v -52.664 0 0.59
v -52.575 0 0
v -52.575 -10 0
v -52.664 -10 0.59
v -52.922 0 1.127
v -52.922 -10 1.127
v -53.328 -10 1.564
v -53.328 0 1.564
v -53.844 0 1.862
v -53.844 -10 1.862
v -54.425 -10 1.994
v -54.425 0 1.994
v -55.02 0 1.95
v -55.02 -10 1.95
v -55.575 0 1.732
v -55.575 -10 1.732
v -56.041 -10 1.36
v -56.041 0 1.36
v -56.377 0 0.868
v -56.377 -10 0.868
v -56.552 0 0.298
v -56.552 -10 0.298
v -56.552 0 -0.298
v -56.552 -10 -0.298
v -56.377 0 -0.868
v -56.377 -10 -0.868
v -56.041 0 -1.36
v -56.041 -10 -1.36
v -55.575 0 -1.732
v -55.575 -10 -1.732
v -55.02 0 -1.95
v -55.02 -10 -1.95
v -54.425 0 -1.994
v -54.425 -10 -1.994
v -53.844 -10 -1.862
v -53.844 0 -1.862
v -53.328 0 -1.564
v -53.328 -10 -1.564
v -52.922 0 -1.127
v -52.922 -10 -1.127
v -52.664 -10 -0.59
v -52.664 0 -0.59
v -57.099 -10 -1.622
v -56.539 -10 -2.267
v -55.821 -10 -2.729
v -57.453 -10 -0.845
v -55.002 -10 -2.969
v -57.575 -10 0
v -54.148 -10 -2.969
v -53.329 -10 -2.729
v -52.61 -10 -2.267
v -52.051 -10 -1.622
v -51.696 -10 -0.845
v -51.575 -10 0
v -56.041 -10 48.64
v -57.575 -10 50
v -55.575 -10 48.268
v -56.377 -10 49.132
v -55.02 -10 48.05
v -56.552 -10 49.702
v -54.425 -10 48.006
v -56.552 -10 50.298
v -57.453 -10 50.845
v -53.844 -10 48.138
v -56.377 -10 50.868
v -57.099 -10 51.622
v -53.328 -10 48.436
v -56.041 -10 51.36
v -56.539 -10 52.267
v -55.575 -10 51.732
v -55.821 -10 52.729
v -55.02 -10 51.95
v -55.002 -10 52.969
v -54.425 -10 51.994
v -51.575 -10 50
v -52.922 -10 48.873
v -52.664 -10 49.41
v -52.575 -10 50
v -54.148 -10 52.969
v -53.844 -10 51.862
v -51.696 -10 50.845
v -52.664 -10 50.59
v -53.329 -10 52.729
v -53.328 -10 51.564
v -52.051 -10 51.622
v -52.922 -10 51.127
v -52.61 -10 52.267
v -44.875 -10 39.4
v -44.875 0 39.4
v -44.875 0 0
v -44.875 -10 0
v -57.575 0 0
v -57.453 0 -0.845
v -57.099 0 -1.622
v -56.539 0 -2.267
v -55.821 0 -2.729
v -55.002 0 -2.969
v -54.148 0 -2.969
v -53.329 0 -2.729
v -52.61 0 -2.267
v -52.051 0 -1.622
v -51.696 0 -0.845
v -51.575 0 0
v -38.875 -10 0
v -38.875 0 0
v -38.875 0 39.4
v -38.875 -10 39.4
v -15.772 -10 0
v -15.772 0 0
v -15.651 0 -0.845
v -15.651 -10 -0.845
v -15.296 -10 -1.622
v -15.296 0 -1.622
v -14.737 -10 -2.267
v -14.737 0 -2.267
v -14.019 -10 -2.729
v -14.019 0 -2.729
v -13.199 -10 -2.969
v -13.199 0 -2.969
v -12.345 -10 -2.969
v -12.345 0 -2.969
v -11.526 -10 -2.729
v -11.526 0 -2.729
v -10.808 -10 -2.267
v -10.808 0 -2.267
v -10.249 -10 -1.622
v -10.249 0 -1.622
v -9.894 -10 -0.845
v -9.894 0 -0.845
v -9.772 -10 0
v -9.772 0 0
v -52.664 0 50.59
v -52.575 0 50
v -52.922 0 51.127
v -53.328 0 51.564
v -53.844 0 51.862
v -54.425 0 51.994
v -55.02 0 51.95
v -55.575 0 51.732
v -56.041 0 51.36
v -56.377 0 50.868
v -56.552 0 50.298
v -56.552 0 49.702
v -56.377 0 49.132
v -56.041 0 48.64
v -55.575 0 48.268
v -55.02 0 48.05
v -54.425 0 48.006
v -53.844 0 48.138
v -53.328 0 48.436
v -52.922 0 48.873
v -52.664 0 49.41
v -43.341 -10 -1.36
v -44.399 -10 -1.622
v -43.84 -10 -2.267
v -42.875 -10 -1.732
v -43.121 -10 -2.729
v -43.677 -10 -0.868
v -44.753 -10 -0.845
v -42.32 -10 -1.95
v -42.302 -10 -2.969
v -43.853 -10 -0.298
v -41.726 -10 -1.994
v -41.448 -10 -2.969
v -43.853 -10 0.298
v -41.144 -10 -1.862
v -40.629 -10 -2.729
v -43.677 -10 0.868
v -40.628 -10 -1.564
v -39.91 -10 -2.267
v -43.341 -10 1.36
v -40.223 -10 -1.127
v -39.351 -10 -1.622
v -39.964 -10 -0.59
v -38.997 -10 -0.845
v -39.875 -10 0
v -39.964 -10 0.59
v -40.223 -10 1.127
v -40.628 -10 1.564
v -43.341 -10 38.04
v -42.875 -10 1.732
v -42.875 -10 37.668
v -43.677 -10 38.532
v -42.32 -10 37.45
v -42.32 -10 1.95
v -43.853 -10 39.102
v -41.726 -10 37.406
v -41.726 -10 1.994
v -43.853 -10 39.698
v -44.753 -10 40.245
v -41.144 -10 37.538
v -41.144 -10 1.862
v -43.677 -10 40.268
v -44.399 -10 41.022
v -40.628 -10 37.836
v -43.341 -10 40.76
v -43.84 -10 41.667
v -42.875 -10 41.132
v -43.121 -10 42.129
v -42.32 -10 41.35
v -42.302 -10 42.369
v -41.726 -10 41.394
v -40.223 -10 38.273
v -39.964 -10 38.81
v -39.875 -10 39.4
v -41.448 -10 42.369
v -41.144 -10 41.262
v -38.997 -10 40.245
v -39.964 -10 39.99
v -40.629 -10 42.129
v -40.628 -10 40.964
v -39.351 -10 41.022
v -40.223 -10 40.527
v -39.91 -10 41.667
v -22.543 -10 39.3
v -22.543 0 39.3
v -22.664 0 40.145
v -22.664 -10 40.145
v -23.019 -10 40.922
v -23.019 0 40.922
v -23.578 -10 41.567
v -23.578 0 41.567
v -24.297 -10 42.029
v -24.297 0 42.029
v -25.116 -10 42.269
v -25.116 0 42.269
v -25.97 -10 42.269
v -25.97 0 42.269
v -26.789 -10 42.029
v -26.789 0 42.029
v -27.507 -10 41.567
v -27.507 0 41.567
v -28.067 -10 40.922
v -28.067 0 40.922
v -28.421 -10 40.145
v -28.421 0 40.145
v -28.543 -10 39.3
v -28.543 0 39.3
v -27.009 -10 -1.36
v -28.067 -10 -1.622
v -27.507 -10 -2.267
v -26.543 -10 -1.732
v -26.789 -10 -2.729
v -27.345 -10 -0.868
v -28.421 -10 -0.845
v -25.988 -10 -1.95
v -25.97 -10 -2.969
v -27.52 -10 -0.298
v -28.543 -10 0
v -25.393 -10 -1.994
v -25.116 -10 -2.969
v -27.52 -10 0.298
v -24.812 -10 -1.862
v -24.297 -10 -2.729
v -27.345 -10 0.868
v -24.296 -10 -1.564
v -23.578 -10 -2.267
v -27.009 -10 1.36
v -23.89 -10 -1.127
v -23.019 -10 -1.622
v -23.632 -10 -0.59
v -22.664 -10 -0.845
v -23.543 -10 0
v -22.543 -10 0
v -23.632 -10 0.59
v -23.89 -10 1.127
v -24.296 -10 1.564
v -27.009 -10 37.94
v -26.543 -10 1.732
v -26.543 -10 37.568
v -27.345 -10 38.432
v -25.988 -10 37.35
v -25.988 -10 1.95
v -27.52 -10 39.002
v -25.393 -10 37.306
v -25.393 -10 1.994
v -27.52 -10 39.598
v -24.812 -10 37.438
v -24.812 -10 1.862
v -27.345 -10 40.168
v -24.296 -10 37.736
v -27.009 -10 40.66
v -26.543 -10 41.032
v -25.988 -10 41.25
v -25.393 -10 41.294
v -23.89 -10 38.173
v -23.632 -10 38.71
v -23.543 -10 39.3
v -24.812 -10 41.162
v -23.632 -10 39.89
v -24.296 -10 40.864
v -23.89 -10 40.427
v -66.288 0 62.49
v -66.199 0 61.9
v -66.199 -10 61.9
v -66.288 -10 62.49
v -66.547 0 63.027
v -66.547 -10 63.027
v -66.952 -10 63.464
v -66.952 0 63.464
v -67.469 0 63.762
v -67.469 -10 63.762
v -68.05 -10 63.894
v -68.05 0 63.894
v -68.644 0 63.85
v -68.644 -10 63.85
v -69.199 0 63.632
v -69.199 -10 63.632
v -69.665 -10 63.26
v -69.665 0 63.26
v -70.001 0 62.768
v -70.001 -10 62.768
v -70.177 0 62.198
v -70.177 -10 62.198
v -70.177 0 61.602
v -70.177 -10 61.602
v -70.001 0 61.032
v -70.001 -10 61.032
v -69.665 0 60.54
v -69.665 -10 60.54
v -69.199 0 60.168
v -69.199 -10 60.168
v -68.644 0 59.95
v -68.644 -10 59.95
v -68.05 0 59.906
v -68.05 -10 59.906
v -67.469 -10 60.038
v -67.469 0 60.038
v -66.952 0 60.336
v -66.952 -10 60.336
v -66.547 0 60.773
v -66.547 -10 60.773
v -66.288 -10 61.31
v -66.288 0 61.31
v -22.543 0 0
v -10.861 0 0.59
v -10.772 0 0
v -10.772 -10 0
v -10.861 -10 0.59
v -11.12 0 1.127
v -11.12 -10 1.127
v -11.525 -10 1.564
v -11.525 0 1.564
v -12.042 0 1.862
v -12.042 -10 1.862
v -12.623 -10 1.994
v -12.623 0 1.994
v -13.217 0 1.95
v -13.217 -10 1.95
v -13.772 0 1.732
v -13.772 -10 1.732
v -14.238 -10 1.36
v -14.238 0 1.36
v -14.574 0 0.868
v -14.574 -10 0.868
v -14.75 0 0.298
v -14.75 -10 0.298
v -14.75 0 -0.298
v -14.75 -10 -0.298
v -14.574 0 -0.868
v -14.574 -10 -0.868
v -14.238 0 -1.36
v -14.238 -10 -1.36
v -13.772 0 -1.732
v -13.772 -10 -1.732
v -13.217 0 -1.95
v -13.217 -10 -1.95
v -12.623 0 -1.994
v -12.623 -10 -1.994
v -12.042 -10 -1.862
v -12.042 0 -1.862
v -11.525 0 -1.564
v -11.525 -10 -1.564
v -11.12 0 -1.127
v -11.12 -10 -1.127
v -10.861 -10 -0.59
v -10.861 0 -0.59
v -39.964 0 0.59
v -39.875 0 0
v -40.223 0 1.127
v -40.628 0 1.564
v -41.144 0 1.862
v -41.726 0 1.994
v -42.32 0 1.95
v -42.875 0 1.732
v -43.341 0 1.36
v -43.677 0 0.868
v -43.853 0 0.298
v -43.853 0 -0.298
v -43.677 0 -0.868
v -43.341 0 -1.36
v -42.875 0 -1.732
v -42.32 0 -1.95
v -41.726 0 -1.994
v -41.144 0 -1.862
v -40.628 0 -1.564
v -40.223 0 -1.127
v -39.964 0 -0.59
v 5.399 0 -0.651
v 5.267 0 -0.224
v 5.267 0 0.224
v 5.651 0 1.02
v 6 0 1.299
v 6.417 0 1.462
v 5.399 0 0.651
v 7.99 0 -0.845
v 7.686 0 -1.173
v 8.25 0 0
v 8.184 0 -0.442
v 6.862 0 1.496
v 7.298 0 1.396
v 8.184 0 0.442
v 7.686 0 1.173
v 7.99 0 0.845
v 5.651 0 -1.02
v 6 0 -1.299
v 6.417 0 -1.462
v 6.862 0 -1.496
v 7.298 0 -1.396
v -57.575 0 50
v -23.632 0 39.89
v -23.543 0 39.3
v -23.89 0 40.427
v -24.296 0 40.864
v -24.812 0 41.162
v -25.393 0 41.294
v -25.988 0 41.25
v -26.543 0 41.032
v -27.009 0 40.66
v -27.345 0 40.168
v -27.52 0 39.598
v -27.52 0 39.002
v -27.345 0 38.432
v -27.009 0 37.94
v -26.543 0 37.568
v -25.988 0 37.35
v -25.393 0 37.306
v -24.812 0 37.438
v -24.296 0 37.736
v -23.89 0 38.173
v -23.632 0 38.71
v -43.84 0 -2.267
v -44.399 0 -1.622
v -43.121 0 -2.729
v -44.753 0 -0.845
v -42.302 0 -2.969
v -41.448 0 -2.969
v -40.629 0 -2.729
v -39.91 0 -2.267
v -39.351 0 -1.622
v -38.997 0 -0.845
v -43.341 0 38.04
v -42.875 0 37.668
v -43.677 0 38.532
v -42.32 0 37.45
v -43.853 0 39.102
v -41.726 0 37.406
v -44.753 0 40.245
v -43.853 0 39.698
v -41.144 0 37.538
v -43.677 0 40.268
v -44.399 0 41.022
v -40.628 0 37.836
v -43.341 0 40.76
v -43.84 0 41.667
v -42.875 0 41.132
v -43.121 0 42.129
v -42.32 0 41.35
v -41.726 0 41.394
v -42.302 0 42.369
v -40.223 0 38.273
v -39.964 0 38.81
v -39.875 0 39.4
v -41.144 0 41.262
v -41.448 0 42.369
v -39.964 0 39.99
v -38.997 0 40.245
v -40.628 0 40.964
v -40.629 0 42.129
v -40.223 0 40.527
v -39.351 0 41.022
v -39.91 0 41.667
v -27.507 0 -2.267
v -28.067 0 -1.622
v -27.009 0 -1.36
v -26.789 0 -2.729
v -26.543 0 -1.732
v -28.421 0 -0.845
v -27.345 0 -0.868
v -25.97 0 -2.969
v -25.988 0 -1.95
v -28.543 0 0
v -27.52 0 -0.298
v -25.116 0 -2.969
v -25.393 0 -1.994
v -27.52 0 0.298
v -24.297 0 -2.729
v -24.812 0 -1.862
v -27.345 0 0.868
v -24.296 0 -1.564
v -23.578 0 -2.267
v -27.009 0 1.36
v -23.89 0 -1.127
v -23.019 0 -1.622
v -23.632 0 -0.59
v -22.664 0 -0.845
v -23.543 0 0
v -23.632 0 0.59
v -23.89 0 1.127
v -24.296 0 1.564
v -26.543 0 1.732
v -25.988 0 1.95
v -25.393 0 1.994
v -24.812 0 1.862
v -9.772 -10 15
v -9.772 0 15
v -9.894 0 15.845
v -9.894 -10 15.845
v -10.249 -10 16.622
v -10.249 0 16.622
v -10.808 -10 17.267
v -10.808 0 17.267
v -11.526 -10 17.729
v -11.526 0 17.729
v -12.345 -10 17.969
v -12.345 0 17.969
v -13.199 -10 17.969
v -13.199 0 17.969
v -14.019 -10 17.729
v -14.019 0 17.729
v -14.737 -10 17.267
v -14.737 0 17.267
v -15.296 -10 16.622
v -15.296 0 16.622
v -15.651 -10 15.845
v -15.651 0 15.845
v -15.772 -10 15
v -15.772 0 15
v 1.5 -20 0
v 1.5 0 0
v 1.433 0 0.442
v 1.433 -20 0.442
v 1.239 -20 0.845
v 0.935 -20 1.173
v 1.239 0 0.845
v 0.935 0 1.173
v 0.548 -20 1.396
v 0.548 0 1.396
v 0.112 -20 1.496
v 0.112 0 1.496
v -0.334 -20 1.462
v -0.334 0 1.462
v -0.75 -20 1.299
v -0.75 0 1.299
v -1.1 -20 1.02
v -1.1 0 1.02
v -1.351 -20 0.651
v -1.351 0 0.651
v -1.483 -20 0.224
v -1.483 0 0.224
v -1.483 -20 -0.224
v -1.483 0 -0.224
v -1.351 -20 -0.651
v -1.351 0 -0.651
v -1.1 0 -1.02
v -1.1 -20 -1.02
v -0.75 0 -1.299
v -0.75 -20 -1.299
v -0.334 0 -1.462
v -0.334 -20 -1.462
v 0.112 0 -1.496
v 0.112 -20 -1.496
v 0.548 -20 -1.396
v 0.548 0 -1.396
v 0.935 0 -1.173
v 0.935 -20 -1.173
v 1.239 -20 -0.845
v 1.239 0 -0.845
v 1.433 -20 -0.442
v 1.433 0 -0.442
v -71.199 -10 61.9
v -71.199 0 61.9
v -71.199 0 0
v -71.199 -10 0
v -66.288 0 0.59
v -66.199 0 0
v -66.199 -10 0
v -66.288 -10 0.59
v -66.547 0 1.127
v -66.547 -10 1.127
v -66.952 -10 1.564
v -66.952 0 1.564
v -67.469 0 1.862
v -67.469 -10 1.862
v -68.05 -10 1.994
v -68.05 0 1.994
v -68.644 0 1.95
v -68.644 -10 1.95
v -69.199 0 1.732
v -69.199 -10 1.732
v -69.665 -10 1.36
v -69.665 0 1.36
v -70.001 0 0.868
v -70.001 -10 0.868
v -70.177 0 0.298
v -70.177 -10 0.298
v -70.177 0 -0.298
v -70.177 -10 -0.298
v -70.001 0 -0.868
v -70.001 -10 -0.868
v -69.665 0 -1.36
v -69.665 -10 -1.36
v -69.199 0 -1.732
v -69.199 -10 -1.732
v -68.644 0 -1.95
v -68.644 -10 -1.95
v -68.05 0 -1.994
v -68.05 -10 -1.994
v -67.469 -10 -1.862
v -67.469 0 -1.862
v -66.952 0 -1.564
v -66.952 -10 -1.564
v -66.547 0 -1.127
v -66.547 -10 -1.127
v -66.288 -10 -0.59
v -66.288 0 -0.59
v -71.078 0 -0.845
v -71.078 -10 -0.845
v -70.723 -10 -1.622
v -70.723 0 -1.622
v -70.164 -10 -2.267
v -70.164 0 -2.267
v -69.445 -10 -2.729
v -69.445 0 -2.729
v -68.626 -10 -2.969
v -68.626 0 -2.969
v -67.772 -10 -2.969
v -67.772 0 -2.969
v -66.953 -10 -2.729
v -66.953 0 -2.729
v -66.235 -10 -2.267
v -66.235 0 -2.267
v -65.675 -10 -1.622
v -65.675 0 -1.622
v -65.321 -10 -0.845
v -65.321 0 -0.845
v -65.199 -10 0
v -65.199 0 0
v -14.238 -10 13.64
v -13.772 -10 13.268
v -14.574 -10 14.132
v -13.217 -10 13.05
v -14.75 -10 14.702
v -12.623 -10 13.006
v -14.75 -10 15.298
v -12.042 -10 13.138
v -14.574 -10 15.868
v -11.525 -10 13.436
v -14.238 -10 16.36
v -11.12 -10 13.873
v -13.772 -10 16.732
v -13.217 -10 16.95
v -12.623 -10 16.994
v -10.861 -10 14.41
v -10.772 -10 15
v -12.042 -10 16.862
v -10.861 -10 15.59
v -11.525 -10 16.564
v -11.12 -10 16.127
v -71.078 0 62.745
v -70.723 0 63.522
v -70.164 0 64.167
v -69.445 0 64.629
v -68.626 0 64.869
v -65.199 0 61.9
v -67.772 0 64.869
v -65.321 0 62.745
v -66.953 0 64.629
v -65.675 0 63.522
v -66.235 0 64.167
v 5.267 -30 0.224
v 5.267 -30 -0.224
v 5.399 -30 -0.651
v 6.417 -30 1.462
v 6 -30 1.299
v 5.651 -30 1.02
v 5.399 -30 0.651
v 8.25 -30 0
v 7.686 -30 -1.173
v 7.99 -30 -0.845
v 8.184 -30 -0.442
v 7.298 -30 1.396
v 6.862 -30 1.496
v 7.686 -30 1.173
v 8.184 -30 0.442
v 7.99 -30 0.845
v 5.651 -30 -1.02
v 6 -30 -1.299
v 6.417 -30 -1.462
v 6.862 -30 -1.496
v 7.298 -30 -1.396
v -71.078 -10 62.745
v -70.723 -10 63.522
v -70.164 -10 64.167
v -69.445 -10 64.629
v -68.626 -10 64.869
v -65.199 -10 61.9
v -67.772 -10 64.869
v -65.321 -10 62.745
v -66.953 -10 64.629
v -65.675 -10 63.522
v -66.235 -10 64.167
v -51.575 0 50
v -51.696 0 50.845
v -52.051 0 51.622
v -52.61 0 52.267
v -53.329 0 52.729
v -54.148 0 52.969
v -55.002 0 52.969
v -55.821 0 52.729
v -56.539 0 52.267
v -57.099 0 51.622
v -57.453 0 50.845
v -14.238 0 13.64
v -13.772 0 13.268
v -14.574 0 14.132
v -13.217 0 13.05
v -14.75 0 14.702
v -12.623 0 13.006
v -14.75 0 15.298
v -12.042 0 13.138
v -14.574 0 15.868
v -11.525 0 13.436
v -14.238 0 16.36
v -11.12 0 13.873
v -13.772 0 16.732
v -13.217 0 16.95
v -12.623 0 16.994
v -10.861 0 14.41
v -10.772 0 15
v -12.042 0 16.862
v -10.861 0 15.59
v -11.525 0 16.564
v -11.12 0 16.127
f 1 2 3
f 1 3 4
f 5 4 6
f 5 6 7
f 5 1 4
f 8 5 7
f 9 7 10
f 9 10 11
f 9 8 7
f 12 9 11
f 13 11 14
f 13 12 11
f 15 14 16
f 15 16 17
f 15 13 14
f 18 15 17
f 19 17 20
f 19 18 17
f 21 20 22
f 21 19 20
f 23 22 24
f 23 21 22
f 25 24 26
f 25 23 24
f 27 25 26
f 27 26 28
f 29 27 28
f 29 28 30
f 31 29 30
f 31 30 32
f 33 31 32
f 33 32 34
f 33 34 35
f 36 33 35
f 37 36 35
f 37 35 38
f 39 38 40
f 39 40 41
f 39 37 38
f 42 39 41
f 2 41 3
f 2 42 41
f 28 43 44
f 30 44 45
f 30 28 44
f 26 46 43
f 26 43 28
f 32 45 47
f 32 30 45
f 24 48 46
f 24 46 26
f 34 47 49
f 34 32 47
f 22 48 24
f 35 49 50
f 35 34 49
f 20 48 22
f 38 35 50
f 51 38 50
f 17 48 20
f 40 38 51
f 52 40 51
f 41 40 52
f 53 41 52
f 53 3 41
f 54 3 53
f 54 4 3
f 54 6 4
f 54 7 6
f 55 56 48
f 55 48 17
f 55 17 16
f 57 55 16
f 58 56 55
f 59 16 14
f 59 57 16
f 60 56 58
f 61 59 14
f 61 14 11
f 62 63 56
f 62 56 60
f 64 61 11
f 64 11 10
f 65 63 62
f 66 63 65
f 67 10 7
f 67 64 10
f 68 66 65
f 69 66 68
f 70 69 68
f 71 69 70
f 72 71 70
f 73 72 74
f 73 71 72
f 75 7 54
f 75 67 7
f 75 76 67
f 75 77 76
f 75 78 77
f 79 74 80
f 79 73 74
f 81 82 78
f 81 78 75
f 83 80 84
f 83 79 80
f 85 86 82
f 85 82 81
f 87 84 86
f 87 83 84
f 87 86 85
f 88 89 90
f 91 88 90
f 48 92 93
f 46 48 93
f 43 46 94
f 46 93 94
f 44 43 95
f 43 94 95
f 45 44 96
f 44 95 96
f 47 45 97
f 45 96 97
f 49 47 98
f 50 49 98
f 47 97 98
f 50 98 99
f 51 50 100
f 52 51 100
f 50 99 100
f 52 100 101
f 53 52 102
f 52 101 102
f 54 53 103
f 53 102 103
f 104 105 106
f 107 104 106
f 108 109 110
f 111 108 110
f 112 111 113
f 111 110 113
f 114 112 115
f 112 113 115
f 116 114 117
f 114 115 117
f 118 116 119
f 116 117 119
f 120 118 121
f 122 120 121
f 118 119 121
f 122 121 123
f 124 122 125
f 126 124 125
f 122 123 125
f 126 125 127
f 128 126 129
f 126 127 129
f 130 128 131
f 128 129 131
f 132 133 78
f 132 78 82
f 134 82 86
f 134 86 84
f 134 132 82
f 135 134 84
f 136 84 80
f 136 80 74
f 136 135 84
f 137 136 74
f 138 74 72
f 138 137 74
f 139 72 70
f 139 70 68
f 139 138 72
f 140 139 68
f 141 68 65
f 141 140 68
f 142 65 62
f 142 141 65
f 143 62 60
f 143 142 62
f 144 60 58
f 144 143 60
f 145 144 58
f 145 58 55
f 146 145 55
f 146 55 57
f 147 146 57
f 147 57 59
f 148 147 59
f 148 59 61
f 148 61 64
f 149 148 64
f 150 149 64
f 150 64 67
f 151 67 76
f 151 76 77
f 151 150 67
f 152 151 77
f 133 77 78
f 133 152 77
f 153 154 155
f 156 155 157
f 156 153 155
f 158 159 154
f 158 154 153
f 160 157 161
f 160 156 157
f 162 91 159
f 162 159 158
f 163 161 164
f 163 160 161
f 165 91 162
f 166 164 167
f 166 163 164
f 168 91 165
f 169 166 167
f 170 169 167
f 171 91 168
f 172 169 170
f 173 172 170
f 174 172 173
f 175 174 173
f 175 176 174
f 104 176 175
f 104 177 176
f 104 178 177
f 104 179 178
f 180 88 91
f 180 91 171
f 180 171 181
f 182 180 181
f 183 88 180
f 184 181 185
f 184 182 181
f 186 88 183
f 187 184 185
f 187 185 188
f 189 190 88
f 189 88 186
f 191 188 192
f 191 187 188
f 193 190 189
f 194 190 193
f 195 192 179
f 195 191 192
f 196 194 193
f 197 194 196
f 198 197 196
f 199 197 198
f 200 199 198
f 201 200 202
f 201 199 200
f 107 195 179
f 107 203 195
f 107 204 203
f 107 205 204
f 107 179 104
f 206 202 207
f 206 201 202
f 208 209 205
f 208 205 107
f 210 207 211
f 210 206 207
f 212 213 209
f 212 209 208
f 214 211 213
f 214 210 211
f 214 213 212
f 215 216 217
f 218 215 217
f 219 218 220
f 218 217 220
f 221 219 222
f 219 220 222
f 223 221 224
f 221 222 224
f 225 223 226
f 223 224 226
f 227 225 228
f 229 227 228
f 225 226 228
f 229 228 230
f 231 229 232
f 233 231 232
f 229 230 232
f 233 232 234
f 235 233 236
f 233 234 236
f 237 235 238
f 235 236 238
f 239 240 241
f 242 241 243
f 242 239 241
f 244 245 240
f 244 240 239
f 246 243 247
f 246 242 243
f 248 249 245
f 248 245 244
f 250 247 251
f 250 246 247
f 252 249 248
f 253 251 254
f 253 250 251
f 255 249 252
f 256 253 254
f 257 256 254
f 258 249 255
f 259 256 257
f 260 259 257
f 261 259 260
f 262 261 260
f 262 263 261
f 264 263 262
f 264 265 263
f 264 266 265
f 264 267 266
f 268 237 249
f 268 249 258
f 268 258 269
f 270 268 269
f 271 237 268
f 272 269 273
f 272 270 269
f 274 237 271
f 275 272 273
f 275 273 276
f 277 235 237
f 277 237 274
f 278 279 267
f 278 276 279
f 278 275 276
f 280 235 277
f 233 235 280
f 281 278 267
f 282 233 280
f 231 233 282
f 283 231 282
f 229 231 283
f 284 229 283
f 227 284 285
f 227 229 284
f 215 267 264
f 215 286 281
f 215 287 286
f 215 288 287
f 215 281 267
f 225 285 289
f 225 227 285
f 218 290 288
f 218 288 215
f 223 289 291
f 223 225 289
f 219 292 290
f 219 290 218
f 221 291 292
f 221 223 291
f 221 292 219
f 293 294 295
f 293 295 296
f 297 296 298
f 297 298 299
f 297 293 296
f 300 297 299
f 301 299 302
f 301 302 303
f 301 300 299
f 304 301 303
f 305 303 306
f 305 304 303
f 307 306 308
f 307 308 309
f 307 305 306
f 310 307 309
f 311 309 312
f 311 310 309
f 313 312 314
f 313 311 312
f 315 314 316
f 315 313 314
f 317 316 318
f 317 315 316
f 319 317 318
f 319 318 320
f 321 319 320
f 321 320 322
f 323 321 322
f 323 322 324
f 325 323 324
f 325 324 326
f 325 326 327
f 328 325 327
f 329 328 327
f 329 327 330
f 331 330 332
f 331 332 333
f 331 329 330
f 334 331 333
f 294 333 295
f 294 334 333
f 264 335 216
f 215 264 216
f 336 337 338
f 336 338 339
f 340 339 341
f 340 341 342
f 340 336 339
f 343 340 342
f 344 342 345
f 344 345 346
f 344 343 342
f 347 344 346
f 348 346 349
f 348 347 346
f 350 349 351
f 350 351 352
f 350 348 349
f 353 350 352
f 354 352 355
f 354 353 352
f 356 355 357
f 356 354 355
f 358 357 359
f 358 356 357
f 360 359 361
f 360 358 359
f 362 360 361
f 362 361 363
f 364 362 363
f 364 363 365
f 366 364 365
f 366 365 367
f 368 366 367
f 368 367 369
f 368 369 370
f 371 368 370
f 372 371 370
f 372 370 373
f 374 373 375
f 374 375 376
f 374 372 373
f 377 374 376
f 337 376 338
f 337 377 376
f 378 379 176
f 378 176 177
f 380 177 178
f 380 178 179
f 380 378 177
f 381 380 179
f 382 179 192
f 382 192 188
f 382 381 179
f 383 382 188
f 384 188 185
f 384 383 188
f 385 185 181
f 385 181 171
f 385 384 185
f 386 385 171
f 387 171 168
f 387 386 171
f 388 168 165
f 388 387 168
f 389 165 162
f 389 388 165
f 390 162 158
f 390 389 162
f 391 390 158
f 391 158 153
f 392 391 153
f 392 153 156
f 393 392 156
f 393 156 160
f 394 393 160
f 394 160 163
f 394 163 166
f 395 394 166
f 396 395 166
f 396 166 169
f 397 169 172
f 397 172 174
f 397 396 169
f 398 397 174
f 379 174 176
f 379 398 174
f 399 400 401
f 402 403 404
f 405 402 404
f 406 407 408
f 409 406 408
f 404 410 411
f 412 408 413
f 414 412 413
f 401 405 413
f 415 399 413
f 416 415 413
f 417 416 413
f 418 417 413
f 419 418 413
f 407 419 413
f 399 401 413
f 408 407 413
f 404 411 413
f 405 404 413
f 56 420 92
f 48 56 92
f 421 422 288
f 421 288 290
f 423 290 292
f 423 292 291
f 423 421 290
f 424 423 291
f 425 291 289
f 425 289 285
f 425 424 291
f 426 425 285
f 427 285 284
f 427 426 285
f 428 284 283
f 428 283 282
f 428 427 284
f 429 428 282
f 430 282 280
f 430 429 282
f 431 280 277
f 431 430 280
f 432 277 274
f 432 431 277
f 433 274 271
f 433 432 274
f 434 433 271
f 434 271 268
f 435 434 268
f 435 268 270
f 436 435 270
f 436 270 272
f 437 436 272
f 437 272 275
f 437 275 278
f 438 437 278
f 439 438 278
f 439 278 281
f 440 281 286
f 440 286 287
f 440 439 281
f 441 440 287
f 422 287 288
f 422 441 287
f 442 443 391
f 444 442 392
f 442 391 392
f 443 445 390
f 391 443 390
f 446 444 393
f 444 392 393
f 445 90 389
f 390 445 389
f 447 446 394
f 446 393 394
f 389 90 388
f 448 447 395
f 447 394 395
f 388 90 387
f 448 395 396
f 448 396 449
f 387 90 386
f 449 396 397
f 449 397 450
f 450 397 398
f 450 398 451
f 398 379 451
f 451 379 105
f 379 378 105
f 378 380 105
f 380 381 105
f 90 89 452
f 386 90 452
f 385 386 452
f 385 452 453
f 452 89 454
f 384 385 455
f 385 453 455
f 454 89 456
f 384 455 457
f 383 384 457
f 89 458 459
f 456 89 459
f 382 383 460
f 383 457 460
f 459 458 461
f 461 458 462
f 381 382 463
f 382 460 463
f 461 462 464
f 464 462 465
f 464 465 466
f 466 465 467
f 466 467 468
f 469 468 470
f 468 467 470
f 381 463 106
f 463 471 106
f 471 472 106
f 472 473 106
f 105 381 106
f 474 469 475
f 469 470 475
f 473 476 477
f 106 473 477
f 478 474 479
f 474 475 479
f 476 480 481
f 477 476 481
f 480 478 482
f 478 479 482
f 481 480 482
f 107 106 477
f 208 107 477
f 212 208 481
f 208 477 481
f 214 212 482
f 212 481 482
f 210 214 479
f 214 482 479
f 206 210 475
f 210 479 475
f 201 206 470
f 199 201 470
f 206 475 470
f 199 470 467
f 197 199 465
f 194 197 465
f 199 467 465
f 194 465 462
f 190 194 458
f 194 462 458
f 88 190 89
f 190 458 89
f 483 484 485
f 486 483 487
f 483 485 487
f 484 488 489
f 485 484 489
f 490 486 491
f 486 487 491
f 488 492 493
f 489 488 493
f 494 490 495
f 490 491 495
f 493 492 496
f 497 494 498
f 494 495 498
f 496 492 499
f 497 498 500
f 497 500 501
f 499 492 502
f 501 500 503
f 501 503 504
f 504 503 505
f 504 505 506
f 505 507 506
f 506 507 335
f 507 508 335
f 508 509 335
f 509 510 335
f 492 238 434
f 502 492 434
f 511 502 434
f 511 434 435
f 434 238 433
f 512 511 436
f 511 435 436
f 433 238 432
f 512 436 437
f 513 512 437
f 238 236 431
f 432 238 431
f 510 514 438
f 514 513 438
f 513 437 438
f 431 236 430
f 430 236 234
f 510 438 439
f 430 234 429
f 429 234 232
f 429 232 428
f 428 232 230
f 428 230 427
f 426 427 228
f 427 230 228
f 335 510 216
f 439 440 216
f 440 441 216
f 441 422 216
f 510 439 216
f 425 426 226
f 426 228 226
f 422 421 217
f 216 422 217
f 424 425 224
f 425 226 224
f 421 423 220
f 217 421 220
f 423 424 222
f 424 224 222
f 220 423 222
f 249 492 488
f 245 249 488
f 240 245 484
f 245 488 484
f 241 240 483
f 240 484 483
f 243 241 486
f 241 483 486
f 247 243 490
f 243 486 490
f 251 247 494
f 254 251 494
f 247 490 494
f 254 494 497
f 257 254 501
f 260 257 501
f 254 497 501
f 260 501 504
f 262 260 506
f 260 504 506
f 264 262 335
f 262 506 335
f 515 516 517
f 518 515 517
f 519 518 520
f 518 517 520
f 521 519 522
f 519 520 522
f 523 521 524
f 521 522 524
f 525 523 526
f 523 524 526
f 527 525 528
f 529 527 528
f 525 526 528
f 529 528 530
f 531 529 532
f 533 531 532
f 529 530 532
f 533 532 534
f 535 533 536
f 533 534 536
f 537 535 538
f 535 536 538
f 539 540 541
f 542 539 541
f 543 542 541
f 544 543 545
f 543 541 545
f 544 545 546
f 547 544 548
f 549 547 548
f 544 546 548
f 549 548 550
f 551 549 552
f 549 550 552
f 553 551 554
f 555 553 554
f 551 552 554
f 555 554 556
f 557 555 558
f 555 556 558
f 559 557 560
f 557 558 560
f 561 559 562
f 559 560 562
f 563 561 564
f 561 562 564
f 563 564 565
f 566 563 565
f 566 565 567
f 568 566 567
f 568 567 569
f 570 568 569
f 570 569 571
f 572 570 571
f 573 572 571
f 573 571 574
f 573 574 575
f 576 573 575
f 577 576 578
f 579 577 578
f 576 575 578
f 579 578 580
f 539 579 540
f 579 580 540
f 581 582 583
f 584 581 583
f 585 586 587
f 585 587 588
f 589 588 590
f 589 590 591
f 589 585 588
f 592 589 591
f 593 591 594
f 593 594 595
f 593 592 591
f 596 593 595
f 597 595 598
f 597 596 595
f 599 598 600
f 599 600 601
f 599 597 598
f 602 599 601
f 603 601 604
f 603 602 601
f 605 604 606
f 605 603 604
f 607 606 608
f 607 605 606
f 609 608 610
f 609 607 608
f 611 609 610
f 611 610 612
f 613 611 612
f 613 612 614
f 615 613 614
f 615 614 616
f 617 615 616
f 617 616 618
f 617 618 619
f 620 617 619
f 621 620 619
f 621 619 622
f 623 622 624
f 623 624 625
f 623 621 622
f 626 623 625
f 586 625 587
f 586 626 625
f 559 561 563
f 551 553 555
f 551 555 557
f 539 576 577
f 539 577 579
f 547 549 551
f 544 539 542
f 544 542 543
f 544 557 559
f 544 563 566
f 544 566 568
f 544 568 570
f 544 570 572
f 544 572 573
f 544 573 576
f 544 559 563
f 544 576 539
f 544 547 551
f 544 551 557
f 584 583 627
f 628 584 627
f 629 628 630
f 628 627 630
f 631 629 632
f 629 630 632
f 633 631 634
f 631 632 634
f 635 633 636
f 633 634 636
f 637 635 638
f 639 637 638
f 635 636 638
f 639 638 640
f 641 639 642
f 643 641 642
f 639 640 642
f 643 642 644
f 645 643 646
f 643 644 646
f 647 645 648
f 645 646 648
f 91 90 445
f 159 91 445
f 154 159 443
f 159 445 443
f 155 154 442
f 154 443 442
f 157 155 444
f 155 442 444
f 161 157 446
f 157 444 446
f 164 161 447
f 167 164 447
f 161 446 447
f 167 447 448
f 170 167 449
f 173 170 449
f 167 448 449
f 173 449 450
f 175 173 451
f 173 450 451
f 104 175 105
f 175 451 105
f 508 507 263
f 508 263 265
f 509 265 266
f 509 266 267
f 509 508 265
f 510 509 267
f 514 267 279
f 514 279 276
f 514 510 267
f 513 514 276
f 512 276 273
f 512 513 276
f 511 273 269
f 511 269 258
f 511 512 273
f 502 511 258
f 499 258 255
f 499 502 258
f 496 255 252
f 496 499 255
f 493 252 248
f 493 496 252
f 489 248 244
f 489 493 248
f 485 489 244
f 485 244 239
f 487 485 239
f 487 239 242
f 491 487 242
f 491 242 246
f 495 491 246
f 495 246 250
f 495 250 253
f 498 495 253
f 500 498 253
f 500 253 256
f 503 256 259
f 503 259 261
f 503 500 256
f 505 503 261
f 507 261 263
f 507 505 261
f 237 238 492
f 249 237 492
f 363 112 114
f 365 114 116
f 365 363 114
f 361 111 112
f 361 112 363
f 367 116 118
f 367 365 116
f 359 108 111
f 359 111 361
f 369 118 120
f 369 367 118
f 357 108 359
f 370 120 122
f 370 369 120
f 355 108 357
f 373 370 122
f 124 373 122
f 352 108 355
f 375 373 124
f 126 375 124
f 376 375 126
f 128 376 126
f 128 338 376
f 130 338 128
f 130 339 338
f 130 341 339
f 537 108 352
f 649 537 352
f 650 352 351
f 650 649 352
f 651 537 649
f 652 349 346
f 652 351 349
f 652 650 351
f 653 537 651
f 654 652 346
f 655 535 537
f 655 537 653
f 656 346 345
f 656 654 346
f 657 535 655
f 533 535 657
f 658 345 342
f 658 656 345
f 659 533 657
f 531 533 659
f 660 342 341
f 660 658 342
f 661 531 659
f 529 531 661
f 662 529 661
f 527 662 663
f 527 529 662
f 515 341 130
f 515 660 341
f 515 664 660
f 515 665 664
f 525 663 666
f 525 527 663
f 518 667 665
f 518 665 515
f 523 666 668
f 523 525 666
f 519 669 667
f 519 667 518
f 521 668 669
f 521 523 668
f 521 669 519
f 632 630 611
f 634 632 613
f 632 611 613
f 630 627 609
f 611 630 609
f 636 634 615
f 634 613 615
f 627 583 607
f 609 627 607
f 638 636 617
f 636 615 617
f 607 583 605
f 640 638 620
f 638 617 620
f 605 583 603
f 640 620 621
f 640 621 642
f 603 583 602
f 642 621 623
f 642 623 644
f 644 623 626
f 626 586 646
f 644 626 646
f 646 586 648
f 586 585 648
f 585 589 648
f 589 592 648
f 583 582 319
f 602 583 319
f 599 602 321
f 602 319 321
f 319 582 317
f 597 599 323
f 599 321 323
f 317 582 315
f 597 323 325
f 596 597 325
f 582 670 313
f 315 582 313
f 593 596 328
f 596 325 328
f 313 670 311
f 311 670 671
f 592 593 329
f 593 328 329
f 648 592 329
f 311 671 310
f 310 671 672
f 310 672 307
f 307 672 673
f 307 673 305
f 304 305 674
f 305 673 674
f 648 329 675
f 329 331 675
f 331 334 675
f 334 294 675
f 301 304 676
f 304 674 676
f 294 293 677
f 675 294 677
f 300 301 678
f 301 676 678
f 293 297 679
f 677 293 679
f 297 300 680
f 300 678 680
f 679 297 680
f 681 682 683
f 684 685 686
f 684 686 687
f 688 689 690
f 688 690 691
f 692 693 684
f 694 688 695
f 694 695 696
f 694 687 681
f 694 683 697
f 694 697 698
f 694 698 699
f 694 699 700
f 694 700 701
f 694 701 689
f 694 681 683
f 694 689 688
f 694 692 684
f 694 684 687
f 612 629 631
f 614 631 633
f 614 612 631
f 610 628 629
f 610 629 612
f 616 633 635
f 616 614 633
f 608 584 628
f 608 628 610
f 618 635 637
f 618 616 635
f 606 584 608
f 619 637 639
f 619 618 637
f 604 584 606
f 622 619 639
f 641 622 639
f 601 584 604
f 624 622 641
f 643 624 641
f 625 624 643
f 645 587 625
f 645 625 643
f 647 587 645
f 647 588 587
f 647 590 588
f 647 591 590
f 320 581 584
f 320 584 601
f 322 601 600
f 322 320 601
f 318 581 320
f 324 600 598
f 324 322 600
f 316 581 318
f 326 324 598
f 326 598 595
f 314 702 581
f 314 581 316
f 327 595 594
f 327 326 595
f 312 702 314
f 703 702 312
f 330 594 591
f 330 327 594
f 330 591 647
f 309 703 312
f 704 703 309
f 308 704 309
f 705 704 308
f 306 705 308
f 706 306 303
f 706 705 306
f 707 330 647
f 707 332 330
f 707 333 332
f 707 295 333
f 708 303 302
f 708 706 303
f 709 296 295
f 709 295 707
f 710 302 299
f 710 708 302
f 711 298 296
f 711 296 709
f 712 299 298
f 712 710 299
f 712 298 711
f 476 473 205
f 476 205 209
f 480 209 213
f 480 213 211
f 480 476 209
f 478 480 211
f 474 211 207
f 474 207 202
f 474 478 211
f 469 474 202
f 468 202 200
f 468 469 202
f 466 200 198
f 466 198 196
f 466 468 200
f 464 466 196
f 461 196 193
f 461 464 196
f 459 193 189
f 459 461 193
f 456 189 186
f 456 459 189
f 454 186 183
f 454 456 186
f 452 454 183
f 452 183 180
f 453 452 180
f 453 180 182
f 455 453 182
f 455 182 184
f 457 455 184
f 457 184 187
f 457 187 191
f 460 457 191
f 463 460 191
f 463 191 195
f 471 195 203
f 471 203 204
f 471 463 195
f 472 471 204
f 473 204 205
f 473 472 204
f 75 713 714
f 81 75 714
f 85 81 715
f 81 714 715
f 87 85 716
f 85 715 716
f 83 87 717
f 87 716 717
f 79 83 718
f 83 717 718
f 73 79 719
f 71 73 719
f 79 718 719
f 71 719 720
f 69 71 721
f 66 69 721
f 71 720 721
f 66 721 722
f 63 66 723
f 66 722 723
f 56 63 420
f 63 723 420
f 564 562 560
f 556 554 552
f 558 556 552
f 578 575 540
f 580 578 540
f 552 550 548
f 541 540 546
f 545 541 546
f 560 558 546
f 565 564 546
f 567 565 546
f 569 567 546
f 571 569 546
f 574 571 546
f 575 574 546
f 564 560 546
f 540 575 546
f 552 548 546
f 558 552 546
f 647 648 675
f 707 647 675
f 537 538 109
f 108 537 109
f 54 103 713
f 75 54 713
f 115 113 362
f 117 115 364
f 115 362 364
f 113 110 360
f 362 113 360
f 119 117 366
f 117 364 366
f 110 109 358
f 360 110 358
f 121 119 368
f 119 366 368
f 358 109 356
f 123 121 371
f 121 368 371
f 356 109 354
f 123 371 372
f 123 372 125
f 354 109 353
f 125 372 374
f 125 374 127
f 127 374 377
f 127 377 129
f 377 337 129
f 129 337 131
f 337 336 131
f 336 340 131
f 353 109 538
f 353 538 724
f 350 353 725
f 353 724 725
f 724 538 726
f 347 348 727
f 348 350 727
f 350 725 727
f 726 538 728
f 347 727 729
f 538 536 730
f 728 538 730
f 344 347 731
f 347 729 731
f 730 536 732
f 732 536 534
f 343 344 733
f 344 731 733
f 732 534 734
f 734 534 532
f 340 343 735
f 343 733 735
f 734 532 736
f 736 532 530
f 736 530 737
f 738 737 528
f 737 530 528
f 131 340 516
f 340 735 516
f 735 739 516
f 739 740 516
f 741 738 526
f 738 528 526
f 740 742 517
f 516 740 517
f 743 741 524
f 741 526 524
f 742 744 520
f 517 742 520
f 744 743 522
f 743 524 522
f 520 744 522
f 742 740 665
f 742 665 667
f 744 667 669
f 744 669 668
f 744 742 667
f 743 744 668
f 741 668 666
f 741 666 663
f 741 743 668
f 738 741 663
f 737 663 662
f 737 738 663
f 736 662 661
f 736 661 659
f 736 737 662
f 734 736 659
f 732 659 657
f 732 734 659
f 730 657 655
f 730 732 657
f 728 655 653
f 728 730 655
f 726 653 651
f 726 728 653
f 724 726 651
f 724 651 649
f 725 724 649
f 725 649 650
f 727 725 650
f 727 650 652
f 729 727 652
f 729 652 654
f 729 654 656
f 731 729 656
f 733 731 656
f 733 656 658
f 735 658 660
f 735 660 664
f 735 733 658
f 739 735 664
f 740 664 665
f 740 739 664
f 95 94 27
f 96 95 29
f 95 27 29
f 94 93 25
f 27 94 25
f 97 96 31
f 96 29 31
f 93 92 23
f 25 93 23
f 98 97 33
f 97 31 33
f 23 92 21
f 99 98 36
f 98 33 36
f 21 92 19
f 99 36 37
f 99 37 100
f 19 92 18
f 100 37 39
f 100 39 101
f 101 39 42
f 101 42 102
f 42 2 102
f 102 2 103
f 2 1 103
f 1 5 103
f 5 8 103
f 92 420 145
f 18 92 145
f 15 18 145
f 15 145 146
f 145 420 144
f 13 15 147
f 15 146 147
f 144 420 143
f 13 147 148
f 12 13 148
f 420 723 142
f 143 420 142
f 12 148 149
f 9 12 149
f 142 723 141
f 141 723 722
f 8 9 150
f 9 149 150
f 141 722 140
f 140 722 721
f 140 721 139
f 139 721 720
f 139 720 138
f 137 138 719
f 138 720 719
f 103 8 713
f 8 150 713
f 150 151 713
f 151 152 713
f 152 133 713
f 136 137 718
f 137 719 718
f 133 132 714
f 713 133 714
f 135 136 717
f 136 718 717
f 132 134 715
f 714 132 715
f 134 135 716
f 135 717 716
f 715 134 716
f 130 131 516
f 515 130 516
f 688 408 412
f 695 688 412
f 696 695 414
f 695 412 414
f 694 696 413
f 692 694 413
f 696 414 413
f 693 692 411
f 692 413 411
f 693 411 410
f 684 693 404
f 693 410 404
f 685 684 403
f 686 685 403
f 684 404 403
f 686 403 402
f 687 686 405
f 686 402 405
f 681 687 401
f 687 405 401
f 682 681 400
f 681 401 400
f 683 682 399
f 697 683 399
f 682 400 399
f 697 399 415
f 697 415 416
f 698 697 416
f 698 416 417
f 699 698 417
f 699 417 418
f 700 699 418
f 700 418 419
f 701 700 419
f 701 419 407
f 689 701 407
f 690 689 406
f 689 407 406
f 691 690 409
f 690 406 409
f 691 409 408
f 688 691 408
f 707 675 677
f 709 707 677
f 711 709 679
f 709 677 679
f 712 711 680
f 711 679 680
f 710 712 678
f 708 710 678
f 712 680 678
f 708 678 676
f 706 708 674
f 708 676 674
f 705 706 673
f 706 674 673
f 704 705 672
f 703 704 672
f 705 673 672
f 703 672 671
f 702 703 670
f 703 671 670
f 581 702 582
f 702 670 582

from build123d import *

# Parameters (mm, degrees)
F1_R      = 2
F2_DEPTH  = 10
F3_R      = 2
F4_DEPTH  = 10
F5_R      = 2
F6_DEPTH  = 10
F7_R      = 2
F8_DEPTH  = 10
F9_R      = 2
F10_DEPTH = 10
F11_R     = 1.5
F12_DEPTH = 20
F13_R     = 1.5
F14_DEPTH = 30


with BuildPart() as f2:
    # F1 (on Front) → F2 (new body)
    with BuildSketch(Plane.XZ):
        with BuildLine():
            Line((-15.7723604936, 15), (-15.7723604936, 0))
            ThreePointArc((-15.7723604936, 0), (-12.7723604936, -3), (-9.7723604936, 0))
            Line((-9.7723604936, 0), (-9.7723604936, 15))
            ThreePointArc((-9.7723604936, 15), (-12.7723604936, 18), (-15.7723604936, 15))
        make_face()
        with Locations((-12.7723604936, 0)):
            Circle(F1_R, mode=Mode.SUBTRACT)
        with Locations((-12.7723604936, 15)):
            Circle(F1_R, mode=Mode.SUBTRACT)
    extrude(amount=F2_DEPTH)


with BuildPart() as f4:
    # F3 (on Front) → F4 (new body)
    with BuildSketch(Plane.XZ):
        with BuildLine():
            Line((-28.5428169801, 39.3), (-28.5428169801, 0))
            ThreePointArc((-28.5428169801, 0), (-25.5428169801, -3), (-22.5428169801, 0))
            Line((-22.5428169801, 0), (-22.5428169801, 39.3))
            ThreePointArc((-22.5428169801, 39.3), (-25.5428169801, 42.3), (-28.5428169801, 39.3))
        make_face()
        with Locations((-25.5428169801, 0)):
            Circle(F3_R, mode=Mode.SUBTRACT)
        with Locations((-25.5428169801, 39.3)):
            Circle(F3_R, mode=Mode.SUBTRACT)
    extrude(amount=F4_DEPTH)


with BuildPart() as f6:
    # F5 (on Front) → F6 (new body)
    with BuildSketch(Plane.XZ):
        with BuildLine():
            Line((-44.8750046201, 39.4), (-44.8750046201, 0))
            ThreePointArc((-44.8750046201, 0), (-41.8750046201, -3), (-38.8750046201, 0))
            Line((-38.8750046201, 0), (-38.8750046201, 39.4))
            ThreePointArc((-38.8750046201, 39.4), (-41.8750046201, 42.4), (-44.8750046201, 39.4))
        make_face()
        with Locations((-41.8750046201, 0)):
            Circle(F5_R, mode=Mode.SUBTRACT)
        with Locations((-41.8750046201, 39.4)):
            Circle(F5_R, mode=Mode.SUBTRACT)
    extrude(amount=F6_DEPTH)


with BuildPart() as f8:
    # F7 (on Front) → F8 (new body)
    with BuildSketch(Plane.XZ):
        with BuildLine():
            Line((-57.5748284761, 50), (-57.5748284761, 0))
            ThreePointArc((-57.5748284761, 0), (-54.5748284761, -3), (-51.5748284761, 0))
            Line((-51.5748284761, 0), (-51.5748284761, 50))
            ThreePointArc((-51.5748284761, 50), (-54.5748284761, 53), (-57.5748284761, 50))
        make_face()
        with Locations((-54.5748284761, 0)):
            Circle(F7_R, mode=Mode.SUBTRACT)
        with Locations((-54.5748284761, 50)):
            Circle(F7_R, mode=Mode.SUBTRACT)
    extrude(amount=F8_DEPTH)


with BuildPart() as f10:
    # F9 (on Front) → F10 (new body)
    with BuildSketch(Plane.XZ):
        with BuildLine():
            Line((-71.1991949677, 61.9), (-71.1991949677, 0))
            ThreePointArc((-71.1991949677, 0), (-68.1991949677, -3), (-65.1991949677, 0))
            Line((-65.1991949677, 0), (-65.1991949677, 61.9))
            ThreePointArc((-65.1991949677, 61.9), (-68.1991949677, 64.9), (-71.1991949677, 61.9))
        make_face()
        with Locations((-68.1991949677, 0)):
            Circle(F9_R, mode=Mode.SUBTRACT)
        with Locations((-68.1991949677, 61.9)):
            Circle(F9_R, mode=Mode.SUBTRACT)
    extrude(amount=F10_DEPTH)


with BuildPart() as f12:
    # F11 (on Front) → F12 (new body)
    with BuildSketch(Plane.XZ):
        Circle(F11_R)
    extrude(amount=F12_DEPTH)


with BuildPart() as f14:
    # F13 (on Front) → F14 (new body)
    with BuildSketch(Plane.XZ):
        with Locations((6.7503562369, 0)):
            Circle(F13_R)
    extrude(amount=F14_DEPTH)


solid = Compound([f2.part, f4.part, f6.part, f8.part, f10.part, f12.part, f14.part])
